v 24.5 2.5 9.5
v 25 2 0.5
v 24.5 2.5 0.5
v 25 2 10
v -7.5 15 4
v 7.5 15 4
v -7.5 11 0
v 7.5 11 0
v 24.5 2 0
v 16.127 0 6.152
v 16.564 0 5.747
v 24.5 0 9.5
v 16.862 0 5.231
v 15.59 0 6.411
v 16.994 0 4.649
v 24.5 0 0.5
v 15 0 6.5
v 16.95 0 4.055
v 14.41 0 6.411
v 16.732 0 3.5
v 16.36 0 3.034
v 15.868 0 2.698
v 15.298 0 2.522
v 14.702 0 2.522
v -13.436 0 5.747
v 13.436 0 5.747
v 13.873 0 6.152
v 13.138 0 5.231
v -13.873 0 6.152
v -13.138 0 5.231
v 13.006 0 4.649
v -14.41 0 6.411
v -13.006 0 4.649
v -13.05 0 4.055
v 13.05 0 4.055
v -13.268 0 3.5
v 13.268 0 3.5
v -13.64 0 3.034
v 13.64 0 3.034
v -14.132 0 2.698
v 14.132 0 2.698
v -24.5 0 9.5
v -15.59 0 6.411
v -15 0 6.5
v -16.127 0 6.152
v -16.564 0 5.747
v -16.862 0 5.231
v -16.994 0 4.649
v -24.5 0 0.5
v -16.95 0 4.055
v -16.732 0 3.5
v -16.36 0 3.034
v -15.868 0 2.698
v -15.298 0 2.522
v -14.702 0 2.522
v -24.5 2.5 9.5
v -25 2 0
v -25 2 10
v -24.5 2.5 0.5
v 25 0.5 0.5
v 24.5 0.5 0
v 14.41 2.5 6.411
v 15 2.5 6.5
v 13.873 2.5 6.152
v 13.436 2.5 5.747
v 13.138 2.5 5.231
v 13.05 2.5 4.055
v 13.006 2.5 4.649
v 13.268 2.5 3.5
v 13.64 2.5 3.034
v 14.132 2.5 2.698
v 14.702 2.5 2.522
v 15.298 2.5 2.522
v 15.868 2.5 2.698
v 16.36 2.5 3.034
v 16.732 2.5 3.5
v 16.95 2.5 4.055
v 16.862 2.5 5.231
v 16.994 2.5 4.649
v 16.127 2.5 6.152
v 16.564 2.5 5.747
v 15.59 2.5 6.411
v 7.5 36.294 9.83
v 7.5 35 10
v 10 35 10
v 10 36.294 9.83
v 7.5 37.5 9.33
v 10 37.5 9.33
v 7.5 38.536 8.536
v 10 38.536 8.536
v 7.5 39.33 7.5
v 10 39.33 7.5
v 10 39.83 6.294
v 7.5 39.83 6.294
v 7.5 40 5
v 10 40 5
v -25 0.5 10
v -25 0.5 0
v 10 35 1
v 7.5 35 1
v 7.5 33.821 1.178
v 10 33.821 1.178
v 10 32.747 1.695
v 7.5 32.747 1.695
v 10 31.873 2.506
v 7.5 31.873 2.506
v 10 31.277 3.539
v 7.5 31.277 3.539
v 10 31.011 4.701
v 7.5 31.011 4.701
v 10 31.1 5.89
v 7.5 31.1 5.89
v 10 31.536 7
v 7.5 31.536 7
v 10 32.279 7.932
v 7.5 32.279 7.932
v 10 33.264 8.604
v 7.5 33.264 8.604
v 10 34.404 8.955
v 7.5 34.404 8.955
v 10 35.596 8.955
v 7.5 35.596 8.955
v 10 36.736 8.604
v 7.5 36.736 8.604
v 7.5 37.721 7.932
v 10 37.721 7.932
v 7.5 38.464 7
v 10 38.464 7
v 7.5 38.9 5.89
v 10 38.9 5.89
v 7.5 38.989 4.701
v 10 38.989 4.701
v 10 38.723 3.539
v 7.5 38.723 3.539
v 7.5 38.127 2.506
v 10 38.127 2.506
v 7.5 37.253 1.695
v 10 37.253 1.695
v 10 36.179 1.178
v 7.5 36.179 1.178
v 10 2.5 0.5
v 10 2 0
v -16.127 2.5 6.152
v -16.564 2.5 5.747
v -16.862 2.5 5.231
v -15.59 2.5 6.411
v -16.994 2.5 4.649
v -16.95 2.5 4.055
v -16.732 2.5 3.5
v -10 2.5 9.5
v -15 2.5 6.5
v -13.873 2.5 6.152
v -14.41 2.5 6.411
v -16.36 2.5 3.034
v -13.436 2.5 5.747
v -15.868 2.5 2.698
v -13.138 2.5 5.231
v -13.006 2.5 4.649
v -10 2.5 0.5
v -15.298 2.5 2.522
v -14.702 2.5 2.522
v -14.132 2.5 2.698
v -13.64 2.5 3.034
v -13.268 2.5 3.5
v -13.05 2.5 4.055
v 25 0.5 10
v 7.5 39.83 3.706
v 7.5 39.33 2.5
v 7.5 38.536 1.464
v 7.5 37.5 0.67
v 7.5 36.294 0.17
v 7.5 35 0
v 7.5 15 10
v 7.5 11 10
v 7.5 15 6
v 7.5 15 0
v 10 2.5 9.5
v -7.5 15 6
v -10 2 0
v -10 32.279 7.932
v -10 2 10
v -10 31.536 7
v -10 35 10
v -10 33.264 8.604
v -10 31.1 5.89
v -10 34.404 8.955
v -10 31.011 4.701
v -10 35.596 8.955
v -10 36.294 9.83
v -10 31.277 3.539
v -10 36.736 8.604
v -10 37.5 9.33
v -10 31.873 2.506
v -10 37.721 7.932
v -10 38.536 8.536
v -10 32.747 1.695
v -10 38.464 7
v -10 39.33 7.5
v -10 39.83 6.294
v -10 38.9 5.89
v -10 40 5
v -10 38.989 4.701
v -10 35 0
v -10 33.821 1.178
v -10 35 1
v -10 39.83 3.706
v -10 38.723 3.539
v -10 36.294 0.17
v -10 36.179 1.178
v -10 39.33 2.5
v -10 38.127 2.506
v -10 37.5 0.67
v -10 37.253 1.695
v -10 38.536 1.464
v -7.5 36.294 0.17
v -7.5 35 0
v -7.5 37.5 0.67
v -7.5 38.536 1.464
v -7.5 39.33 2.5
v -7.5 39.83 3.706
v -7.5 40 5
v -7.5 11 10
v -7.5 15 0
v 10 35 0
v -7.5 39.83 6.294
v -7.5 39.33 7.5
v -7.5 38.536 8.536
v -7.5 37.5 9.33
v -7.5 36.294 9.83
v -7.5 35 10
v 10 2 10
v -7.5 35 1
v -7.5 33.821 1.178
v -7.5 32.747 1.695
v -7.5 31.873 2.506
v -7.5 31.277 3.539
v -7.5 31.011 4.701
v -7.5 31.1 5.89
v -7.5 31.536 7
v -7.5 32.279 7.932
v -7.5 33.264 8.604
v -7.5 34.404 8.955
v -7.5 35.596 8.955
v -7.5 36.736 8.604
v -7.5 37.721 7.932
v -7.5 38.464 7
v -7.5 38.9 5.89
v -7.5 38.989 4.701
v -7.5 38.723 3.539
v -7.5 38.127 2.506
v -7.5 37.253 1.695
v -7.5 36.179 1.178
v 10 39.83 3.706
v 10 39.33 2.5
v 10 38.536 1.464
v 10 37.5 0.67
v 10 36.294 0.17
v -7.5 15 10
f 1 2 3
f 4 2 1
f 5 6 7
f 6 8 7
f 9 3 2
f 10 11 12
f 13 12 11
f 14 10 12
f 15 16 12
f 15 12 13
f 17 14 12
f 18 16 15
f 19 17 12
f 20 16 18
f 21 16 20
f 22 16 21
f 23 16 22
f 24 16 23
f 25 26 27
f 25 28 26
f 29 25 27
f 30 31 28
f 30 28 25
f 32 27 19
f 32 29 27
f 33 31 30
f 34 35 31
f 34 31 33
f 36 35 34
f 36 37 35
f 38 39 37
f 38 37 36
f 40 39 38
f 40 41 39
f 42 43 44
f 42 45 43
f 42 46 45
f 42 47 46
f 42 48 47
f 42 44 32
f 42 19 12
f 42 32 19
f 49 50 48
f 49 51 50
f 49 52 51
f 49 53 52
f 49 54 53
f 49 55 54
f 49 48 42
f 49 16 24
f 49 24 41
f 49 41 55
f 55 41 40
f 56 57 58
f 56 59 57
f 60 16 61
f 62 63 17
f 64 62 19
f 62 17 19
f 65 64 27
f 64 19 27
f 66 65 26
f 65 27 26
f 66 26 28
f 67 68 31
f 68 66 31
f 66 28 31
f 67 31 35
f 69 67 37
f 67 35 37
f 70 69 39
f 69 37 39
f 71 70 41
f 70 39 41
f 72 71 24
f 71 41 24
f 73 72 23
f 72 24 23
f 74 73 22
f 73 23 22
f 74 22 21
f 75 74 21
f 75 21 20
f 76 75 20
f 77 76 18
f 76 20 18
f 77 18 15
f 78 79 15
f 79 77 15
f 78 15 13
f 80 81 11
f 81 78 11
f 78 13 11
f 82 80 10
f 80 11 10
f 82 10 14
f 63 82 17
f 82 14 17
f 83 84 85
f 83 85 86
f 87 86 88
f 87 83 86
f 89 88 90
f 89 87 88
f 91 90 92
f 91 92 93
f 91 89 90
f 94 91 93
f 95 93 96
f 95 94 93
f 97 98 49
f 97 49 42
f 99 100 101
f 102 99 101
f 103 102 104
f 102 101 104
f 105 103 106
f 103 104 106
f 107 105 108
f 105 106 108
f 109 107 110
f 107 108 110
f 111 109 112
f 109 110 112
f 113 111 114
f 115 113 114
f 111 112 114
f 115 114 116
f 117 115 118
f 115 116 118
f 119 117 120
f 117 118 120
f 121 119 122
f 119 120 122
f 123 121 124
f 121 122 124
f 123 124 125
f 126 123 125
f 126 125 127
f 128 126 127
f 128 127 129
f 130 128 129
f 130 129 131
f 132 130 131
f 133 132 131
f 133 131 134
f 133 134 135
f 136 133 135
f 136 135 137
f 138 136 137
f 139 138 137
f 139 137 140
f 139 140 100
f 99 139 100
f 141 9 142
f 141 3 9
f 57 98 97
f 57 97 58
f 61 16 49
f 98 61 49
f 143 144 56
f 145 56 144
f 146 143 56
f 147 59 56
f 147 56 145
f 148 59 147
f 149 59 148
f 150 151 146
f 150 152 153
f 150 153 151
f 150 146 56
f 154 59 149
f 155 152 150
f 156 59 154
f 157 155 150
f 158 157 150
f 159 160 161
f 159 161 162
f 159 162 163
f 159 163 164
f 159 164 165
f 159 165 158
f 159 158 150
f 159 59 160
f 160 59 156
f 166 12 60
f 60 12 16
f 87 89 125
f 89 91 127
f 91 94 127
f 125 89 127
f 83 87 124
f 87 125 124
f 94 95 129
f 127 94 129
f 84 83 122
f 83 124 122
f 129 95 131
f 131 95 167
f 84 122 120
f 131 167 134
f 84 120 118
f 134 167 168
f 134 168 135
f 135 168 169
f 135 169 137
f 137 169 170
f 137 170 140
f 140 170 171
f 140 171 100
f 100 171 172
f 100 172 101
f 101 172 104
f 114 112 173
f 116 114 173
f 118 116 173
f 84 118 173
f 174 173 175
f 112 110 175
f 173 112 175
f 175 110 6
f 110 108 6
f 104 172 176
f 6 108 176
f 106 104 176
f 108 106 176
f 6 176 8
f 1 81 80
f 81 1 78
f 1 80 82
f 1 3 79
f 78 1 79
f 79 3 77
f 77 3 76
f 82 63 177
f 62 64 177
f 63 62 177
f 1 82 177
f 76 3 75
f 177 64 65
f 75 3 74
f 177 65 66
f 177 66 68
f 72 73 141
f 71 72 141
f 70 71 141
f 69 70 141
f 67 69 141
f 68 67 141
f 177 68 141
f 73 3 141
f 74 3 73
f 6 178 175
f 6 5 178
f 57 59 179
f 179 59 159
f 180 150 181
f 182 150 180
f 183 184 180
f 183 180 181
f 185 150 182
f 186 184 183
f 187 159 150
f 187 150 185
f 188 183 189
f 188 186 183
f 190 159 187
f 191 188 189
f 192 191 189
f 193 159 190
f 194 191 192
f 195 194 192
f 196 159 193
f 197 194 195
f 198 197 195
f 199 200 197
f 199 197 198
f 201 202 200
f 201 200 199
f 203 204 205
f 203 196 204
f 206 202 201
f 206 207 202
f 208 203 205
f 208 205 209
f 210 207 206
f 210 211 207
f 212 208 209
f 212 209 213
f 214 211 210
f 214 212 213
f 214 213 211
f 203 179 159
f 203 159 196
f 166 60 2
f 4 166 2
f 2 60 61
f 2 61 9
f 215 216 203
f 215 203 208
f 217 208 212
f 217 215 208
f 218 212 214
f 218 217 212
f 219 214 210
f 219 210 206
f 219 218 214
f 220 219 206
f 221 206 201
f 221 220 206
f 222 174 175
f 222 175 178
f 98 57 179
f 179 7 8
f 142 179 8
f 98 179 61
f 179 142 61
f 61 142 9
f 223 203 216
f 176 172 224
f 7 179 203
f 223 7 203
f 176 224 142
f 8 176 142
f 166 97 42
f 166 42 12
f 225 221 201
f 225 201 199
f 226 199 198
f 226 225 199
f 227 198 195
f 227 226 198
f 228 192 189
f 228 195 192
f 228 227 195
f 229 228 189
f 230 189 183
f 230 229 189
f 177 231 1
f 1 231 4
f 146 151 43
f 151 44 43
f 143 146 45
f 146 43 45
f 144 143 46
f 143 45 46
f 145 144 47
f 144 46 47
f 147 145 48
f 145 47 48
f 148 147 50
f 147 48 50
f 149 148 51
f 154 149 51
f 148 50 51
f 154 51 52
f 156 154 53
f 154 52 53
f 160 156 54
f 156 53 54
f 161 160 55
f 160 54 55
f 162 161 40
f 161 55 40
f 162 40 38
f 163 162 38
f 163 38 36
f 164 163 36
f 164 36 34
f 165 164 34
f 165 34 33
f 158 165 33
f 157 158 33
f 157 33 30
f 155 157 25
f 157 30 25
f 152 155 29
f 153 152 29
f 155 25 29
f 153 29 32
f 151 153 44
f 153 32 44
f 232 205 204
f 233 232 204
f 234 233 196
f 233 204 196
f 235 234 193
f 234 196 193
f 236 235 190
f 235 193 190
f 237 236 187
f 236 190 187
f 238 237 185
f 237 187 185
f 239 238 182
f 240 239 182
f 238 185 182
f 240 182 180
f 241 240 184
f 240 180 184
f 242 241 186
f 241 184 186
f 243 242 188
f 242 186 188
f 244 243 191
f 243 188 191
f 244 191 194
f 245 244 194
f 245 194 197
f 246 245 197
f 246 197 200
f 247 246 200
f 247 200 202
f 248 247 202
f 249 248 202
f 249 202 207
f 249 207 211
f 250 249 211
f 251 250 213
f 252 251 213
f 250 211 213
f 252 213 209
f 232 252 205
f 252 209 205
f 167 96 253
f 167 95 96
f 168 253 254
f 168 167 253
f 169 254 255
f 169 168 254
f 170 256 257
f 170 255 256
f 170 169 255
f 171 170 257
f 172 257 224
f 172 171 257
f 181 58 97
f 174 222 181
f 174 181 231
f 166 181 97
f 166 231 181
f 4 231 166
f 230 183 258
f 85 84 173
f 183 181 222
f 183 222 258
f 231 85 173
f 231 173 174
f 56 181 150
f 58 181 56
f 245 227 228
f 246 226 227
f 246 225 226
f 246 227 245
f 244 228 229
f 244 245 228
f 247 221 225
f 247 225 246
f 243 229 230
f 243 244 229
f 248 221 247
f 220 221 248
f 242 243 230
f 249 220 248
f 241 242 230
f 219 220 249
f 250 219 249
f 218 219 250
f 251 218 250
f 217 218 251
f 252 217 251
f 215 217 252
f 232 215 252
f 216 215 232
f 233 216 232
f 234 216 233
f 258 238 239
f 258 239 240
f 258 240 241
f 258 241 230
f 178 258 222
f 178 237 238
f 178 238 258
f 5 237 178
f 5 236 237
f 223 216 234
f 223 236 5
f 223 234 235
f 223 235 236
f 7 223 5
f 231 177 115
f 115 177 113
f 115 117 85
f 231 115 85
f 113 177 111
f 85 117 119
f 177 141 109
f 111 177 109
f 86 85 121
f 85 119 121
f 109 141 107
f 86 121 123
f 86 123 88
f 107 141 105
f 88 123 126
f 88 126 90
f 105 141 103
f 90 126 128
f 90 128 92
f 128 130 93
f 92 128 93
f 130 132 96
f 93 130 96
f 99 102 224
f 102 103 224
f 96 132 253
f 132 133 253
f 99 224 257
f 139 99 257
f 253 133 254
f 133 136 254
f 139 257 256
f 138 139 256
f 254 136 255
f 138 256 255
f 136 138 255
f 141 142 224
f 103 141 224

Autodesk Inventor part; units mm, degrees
ref_plane "YZ Plane" through (0, 0, 0) normal (1, 0, 0) x (0, 1, 0)
ref_plane "XZ Plane" through (0, 0, 0) normal (0, 1, 0) x (-1, 0, 0)
ref_plane "XY Plane" through (0, 0, 0) normal (0, 0, 1) x (1, 0, 0)
sketch "Sketch4" plane through (0, 0, 0) normal (0, 0, 1) x (1, 0, 0)
  line L0 (0, 0) -> (-25, 0)
  line L1 (-25, 0) -> (-25, 2.5)
  line L2 (-25, 2.5) -> (-10, 2.5)
  line L3 (-10, 2.5) -> (-10, 40)
  line L4 (-10, 40) -> (-7.5, 40)
  line L5 (-7.5, 40) -> (-7.5, 15)
  line L6 (-7.5, 15) -> (0, 15)
  line L7 (0, 15) -> (0, 0)
  line L8 (0, 0) -> (25, 0)
  line L9 (25, 0) -> (25, 2.5)
  line L10 (25, 2.5) -> (10, 2.5)
  line L11 (10, 2.5) -> (10, 40)
  line L12 (10, 40) -> (7.5, 40)
  line L13 (7.5, 40) -> (7.5, 15)
  line L14 (7.5, 15) -> (0, 15)
  dimension "d43" = 25
  dimension "d44" = 2.5
  dimension "d45" = 15
  dimension "d46" = 37.5
  dimension "d47" = 2.5
  dimension "d48" = 25
extrude "Extrusion3" add sketch "Sketch4" along normal blind 10
fillet "Fillet6" radius 5 4 edges at (8.75, 40, 10) (8.75, 40, 0) (-8.75, 40, 0) (-8.75, 40, 10)
chamfer "Chamfer1" distance 0.5 angle 45 11 edges at (17.5, 2.5, 0) (25, 2.5, 5) (17.5, 2.5, 10) (-17.5, 2.5, 0) (-25, 2.5, 5) (-17.5, 2.5, 10) (-12.5, 0, 0) (-25, 0, 5) (-12.5, 0, 10) (25, 0, 5) (25, 1.25, 0)
sketch "Sketch5" plane through (-24.5, 2.5, 0.5) normal (0, 1, 0) x (1, 0, 0)
  line L0 (0, -9) -> (0, 0) projected
  line L1 (0, 0) -> (14.5, 0) projected
  point P0 (24.5, 0.5)
  point P1 (9.5, -4)
  dimension "d57" = 9.5
  dimension "d58" = 4
hole "Hole2" at (-15, 2.5, 4.5) direction (0, -1, 0) diameter 4 end through all
thread "Thread3" size "M4x0.7" class "6H" standard "ANSI Metric M Profile" full length
mirror "Mirror1" about plane through (0, 0, 0) normal (1, 0, 0) of "Hole2"
sketch "Sketch6" plane through (10, 35, 5) normal (1, 0, 0) x (0, 0, -1)
  arc A0 (5, 0) -> (-5, 0) centre (0, 0) ccw projected
  point P0 (5, -35)
hole "Hole3" at (10, 35, 5) direction (-1, 0, 0) diameter 8 end through all
chamfer "Chamfer2" distance 4 angle 45 1 edges at (0, 15, 10)
chamfer "Chamfer3" distance 4 angle 45 1 edges at (0, 15, 0)
properties part number "Bearing Block"
